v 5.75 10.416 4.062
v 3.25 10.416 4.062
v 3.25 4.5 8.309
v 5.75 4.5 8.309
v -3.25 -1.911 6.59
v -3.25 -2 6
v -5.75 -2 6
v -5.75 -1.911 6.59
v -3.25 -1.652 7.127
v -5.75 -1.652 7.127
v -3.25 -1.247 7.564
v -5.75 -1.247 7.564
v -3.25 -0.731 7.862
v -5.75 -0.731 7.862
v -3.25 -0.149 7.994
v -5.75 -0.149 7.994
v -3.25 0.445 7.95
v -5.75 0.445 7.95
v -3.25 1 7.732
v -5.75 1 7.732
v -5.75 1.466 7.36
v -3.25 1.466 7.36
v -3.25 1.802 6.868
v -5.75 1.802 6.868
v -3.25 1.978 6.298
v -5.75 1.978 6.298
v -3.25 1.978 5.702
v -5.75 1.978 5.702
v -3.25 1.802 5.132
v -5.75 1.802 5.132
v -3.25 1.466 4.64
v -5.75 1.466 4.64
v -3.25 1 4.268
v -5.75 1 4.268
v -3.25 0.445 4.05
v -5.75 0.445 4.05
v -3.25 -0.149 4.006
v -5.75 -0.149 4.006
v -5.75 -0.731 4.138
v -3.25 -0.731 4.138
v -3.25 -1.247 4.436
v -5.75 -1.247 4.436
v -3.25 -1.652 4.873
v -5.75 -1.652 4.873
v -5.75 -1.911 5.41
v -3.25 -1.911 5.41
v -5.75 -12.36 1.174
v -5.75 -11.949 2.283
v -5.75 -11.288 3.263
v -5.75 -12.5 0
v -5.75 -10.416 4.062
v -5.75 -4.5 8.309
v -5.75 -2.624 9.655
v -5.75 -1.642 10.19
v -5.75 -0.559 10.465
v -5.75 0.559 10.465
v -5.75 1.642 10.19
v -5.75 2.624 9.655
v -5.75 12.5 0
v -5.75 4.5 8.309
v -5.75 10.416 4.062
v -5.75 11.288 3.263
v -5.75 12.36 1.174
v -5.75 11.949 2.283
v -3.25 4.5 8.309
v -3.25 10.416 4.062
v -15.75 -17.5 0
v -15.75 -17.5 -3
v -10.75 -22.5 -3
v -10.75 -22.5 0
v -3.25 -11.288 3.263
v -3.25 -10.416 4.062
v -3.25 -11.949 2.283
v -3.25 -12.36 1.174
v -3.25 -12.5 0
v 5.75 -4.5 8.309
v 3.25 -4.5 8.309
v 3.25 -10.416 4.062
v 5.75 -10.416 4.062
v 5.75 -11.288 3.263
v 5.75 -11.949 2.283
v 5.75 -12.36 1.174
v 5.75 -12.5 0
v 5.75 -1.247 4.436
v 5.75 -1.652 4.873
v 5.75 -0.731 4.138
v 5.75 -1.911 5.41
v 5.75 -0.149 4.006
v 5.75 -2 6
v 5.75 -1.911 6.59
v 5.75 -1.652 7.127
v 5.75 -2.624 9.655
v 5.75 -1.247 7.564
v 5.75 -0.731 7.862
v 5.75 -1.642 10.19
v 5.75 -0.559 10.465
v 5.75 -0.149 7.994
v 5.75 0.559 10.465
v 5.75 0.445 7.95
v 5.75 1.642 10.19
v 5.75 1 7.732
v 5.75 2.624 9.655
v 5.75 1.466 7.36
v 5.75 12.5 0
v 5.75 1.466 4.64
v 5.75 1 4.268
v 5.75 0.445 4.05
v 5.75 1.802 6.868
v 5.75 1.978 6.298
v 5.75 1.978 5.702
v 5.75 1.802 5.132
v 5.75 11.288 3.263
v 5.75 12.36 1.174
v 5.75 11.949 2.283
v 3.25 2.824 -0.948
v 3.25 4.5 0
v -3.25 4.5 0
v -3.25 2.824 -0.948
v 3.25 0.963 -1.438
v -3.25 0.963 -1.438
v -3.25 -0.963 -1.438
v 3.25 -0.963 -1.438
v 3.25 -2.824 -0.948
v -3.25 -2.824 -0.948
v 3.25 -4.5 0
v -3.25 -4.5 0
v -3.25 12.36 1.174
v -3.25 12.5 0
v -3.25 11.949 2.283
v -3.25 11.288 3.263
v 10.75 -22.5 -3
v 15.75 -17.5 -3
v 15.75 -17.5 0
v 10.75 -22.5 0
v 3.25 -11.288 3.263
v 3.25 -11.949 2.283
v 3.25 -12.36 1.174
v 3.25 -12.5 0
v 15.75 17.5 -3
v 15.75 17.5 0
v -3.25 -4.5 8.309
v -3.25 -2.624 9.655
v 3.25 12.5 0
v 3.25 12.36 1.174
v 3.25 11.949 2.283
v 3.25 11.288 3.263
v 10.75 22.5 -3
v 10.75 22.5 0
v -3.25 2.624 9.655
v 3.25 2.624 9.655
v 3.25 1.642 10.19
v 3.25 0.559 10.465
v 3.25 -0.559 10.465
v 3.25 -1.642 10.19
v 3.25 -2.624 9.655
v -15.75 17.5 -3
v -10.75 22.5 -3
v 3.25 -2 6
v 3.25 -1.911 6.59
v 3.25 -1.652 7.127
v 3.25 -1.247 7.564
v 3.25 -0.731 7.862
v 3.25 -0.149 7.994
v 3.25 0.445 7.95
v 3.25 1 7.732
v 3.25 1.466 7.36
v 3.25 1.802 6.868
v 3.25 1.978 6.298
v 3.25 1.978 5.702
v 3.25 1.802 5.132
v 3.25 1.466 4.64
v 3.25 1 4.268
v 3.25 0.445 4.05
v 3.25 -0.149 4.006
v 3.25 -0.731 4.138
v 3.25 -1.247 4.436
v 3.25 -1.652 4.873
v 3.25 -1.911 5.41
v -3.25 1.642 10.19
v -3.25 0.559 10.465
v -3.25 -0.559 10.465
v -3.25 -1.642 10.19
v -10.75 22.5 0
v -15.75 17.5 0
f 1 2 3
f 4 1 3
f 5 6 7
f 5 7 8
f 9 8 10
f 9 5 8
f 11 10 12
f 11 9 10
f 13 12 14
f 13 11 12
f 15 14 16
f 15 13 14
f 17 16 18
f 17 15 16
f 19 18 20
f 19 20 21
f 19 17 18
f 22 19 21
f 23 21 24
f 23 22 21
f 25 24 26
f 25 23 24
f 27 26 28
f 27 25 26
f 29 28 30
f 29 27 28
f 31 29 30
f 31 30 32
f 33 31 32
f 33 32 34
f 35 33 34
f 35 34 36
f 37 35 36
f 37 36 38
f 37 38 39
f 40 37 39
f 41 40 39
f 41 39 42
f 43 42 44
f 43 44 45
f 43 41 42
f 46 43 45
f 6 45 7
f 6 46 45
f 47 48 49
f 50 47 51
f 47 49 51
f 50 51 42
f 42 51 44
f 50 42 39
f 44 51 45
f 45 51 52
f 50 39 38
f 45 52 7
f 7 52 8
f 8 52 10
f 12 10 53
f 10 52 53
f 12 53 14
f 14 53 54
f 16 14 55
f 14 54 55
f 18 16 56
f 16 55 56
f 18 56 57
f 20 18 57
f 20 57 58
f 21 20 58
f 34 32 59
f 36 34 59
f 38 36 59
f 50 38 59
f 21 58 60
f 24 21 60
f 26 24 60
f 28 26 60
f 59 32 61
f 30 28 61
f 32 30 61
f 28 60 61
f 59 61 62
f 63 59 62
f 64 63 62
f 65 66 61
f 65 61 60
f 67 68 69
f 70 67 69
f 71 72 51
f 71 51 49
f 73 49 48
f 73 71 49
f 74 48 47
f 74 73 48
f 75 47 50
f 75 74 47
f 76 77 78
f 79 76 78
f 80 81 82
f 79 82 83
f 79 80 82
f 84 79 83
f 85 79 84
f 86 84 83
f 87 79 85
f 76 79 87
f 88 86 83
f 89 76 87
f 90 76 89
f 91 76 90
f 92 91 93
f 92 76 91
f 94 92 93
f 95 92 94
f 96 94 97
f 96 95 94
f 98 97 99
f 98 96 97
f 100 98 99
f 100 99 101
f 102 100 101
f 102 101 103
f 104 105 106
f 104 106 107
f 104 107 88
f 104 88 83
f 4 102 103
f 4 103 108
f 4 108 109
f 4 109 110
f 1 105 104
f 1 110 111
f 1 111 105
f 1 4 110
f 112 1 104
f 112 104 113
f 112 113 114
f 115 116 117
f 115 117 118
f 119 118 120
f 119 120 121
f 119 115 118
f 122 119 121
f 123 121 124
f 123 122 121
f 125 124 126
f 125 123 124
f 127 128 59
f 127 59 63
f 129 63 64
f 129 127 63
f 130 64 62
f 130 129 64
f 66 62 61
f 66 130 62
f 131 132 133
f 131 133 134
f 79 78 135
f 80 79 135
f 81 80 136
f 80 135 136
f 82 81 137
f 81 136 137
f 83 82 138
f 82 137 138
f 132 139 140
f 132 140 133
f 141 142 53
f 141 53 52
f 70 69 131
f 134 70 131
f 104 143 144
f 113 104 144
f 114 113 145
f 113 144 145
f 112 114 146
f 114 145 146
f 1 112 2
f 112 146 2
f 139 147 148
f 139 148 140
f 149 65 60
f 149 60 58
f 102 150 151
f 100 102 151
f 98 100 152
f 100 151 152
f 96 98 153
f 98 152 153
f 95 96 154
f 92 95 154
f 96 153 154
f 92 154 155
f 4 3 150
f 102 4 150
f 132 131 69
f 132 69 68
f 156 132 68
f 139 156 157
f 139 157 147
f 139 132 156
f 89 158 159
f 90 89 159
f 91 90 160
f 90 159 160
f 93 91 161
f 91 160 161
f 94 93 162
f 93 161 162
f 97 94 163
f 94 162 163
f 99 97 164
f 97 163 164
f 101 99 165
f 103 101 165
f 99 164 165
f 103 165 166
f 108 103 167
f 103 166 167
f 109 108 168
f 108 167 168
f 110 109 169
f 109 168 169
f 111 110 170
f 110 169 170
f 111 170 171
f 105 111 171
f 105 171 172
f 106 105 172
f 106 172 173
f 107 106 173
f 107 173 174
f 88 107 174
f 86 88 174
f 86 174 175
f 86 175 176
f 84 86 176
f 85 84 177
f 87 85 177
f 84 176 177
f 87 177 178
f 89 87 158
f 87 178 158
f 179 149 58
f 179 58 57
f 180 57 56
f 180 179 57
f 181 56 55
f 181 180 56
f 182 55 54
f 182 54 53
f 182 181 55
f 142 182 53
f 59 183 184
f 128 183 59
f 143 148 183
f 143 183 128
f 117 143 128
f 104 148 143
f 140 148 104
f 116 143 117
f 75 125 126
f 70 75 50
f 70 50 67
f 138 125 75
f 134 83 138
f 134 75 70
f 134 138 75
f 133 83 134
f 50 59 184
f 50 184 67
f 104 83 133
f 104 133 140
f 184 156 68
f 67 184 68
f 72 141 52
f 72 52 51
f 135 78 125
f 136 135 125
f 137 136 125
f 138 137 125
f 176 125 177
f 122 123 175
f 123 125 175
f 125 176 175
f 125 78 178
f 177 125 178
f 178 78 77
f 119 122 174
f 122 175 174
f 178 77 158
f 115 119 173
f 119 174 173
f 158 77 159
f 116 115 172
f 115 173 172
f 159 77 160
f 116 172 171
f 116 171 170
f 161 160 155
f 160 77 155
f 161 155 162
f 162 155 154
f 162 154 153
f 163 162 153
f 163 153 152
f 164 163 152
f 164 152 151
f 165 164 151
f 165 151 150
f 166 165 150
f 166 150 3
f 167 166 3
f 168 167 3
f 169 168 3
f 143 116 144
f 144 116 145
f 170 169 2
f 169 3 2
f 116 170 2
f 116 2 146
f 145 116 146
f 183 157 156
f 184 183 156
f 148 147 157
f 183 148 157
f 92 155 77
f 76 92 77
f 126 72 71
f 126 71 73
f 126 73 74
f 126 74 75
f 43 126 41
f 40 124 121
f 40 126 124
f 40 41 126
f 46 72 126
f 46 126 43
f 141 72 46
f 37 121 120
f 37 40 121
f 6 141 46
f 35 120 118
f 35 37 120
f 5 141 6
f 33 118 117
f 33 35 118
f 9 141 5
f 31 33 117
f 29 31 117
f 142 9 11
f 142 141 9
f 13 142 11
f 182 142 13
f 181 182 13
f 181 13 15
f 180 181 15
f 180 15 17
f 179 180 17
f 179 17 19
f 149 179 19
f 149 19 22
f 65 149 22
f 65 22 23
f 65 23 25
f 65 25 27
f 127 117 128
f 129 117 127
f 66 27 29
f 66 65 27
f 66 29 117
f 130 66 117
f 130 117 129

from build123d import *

# Parameters (mm, degrees)
F1_DEPTH = 3.25
F3_DEPTH = 2.5
F5_DEPTH = 3


with BuildPart() as f1:
    # F0 (on Right) → F1 (new body)
    with BuildSketch(Plane.YZ):
        with BuildLine():
            Line((-12.5, 0), (-12.5, -3))
            Line((-12.5, -3), (12.5, -3))
            Line((12.5, -3), (12.5, 0))
            Line((12.5, 0), (4.5, 0))
            ThreePointArc((4.5, 0), (0, -1.5), (-4.5, 0))
            Line((-4.5, 0), (-12.5, 0))
        make_face()
    extrude(amount=F1_DEPTH)

    # F2 (on face) → F3 (join)
    with BuildSketch(Plane.YZ.offset(3.25)):
        with BuildLine():
            Line((-2.624389, 9.655486), (-4.5, 8.308926))
            Line((-4.5, 8.308926), (-10.415988, 4.061652))
            ThreePointArc((-10.415988, 4.061652), (-11.948592, 2.282549), (-12.5, 0))
            Line((-12.5, 0), (-12.5, -3))
            Line((-12.5, -3), (12.5, -3))
            Line((12.5, -3), (12.5, 0))
            ThreePointArc((12.5, 0), (11.948592, 2.282549), (10.415988, 4.061652))
            Line((10.415988, 4.061652), (4.5, 8.308926))
            Line((4.5, 8.308926), (2.624389, 9.655486))
            ThreePointArc((2.624389, 9.655486), (0, 10.5), (-2.624389, 9.655486))
        make_face()
        with BuildLine():
            ThreePointArc((2, 6), (0, 4), (-2, 6))
            ThreePointArc((-2, 6), (0, 8), (2, 6))
        make_face(mode=Mode.SUBTRACT)
    extrude(amount=F3_DEPTH)

    # F4 (on face) → F5 (join, through all)
    with BuildSketch(Plane(origin=(0, 0, -3), x_dir=(1, 0, 0), z_dir=(0, 0, -1))):
        Polygon((4.75, -11.5), (0, -11.5), (0, -22.5), (10.75, -22.5), (15.75, -17.5), (15.75, 17.5), (10.75, 22.5), (0, 22.5), (0, 11.5), (4.75, 11.5), align=None)
    extrude(amount=-F5_DEPTH)

    # F6: F1 across plane


with BuildPart() as f1_1:
    add(f1.part)
    add(f1.part.mirror(Plane.YZ))


solid = f1_1.part
